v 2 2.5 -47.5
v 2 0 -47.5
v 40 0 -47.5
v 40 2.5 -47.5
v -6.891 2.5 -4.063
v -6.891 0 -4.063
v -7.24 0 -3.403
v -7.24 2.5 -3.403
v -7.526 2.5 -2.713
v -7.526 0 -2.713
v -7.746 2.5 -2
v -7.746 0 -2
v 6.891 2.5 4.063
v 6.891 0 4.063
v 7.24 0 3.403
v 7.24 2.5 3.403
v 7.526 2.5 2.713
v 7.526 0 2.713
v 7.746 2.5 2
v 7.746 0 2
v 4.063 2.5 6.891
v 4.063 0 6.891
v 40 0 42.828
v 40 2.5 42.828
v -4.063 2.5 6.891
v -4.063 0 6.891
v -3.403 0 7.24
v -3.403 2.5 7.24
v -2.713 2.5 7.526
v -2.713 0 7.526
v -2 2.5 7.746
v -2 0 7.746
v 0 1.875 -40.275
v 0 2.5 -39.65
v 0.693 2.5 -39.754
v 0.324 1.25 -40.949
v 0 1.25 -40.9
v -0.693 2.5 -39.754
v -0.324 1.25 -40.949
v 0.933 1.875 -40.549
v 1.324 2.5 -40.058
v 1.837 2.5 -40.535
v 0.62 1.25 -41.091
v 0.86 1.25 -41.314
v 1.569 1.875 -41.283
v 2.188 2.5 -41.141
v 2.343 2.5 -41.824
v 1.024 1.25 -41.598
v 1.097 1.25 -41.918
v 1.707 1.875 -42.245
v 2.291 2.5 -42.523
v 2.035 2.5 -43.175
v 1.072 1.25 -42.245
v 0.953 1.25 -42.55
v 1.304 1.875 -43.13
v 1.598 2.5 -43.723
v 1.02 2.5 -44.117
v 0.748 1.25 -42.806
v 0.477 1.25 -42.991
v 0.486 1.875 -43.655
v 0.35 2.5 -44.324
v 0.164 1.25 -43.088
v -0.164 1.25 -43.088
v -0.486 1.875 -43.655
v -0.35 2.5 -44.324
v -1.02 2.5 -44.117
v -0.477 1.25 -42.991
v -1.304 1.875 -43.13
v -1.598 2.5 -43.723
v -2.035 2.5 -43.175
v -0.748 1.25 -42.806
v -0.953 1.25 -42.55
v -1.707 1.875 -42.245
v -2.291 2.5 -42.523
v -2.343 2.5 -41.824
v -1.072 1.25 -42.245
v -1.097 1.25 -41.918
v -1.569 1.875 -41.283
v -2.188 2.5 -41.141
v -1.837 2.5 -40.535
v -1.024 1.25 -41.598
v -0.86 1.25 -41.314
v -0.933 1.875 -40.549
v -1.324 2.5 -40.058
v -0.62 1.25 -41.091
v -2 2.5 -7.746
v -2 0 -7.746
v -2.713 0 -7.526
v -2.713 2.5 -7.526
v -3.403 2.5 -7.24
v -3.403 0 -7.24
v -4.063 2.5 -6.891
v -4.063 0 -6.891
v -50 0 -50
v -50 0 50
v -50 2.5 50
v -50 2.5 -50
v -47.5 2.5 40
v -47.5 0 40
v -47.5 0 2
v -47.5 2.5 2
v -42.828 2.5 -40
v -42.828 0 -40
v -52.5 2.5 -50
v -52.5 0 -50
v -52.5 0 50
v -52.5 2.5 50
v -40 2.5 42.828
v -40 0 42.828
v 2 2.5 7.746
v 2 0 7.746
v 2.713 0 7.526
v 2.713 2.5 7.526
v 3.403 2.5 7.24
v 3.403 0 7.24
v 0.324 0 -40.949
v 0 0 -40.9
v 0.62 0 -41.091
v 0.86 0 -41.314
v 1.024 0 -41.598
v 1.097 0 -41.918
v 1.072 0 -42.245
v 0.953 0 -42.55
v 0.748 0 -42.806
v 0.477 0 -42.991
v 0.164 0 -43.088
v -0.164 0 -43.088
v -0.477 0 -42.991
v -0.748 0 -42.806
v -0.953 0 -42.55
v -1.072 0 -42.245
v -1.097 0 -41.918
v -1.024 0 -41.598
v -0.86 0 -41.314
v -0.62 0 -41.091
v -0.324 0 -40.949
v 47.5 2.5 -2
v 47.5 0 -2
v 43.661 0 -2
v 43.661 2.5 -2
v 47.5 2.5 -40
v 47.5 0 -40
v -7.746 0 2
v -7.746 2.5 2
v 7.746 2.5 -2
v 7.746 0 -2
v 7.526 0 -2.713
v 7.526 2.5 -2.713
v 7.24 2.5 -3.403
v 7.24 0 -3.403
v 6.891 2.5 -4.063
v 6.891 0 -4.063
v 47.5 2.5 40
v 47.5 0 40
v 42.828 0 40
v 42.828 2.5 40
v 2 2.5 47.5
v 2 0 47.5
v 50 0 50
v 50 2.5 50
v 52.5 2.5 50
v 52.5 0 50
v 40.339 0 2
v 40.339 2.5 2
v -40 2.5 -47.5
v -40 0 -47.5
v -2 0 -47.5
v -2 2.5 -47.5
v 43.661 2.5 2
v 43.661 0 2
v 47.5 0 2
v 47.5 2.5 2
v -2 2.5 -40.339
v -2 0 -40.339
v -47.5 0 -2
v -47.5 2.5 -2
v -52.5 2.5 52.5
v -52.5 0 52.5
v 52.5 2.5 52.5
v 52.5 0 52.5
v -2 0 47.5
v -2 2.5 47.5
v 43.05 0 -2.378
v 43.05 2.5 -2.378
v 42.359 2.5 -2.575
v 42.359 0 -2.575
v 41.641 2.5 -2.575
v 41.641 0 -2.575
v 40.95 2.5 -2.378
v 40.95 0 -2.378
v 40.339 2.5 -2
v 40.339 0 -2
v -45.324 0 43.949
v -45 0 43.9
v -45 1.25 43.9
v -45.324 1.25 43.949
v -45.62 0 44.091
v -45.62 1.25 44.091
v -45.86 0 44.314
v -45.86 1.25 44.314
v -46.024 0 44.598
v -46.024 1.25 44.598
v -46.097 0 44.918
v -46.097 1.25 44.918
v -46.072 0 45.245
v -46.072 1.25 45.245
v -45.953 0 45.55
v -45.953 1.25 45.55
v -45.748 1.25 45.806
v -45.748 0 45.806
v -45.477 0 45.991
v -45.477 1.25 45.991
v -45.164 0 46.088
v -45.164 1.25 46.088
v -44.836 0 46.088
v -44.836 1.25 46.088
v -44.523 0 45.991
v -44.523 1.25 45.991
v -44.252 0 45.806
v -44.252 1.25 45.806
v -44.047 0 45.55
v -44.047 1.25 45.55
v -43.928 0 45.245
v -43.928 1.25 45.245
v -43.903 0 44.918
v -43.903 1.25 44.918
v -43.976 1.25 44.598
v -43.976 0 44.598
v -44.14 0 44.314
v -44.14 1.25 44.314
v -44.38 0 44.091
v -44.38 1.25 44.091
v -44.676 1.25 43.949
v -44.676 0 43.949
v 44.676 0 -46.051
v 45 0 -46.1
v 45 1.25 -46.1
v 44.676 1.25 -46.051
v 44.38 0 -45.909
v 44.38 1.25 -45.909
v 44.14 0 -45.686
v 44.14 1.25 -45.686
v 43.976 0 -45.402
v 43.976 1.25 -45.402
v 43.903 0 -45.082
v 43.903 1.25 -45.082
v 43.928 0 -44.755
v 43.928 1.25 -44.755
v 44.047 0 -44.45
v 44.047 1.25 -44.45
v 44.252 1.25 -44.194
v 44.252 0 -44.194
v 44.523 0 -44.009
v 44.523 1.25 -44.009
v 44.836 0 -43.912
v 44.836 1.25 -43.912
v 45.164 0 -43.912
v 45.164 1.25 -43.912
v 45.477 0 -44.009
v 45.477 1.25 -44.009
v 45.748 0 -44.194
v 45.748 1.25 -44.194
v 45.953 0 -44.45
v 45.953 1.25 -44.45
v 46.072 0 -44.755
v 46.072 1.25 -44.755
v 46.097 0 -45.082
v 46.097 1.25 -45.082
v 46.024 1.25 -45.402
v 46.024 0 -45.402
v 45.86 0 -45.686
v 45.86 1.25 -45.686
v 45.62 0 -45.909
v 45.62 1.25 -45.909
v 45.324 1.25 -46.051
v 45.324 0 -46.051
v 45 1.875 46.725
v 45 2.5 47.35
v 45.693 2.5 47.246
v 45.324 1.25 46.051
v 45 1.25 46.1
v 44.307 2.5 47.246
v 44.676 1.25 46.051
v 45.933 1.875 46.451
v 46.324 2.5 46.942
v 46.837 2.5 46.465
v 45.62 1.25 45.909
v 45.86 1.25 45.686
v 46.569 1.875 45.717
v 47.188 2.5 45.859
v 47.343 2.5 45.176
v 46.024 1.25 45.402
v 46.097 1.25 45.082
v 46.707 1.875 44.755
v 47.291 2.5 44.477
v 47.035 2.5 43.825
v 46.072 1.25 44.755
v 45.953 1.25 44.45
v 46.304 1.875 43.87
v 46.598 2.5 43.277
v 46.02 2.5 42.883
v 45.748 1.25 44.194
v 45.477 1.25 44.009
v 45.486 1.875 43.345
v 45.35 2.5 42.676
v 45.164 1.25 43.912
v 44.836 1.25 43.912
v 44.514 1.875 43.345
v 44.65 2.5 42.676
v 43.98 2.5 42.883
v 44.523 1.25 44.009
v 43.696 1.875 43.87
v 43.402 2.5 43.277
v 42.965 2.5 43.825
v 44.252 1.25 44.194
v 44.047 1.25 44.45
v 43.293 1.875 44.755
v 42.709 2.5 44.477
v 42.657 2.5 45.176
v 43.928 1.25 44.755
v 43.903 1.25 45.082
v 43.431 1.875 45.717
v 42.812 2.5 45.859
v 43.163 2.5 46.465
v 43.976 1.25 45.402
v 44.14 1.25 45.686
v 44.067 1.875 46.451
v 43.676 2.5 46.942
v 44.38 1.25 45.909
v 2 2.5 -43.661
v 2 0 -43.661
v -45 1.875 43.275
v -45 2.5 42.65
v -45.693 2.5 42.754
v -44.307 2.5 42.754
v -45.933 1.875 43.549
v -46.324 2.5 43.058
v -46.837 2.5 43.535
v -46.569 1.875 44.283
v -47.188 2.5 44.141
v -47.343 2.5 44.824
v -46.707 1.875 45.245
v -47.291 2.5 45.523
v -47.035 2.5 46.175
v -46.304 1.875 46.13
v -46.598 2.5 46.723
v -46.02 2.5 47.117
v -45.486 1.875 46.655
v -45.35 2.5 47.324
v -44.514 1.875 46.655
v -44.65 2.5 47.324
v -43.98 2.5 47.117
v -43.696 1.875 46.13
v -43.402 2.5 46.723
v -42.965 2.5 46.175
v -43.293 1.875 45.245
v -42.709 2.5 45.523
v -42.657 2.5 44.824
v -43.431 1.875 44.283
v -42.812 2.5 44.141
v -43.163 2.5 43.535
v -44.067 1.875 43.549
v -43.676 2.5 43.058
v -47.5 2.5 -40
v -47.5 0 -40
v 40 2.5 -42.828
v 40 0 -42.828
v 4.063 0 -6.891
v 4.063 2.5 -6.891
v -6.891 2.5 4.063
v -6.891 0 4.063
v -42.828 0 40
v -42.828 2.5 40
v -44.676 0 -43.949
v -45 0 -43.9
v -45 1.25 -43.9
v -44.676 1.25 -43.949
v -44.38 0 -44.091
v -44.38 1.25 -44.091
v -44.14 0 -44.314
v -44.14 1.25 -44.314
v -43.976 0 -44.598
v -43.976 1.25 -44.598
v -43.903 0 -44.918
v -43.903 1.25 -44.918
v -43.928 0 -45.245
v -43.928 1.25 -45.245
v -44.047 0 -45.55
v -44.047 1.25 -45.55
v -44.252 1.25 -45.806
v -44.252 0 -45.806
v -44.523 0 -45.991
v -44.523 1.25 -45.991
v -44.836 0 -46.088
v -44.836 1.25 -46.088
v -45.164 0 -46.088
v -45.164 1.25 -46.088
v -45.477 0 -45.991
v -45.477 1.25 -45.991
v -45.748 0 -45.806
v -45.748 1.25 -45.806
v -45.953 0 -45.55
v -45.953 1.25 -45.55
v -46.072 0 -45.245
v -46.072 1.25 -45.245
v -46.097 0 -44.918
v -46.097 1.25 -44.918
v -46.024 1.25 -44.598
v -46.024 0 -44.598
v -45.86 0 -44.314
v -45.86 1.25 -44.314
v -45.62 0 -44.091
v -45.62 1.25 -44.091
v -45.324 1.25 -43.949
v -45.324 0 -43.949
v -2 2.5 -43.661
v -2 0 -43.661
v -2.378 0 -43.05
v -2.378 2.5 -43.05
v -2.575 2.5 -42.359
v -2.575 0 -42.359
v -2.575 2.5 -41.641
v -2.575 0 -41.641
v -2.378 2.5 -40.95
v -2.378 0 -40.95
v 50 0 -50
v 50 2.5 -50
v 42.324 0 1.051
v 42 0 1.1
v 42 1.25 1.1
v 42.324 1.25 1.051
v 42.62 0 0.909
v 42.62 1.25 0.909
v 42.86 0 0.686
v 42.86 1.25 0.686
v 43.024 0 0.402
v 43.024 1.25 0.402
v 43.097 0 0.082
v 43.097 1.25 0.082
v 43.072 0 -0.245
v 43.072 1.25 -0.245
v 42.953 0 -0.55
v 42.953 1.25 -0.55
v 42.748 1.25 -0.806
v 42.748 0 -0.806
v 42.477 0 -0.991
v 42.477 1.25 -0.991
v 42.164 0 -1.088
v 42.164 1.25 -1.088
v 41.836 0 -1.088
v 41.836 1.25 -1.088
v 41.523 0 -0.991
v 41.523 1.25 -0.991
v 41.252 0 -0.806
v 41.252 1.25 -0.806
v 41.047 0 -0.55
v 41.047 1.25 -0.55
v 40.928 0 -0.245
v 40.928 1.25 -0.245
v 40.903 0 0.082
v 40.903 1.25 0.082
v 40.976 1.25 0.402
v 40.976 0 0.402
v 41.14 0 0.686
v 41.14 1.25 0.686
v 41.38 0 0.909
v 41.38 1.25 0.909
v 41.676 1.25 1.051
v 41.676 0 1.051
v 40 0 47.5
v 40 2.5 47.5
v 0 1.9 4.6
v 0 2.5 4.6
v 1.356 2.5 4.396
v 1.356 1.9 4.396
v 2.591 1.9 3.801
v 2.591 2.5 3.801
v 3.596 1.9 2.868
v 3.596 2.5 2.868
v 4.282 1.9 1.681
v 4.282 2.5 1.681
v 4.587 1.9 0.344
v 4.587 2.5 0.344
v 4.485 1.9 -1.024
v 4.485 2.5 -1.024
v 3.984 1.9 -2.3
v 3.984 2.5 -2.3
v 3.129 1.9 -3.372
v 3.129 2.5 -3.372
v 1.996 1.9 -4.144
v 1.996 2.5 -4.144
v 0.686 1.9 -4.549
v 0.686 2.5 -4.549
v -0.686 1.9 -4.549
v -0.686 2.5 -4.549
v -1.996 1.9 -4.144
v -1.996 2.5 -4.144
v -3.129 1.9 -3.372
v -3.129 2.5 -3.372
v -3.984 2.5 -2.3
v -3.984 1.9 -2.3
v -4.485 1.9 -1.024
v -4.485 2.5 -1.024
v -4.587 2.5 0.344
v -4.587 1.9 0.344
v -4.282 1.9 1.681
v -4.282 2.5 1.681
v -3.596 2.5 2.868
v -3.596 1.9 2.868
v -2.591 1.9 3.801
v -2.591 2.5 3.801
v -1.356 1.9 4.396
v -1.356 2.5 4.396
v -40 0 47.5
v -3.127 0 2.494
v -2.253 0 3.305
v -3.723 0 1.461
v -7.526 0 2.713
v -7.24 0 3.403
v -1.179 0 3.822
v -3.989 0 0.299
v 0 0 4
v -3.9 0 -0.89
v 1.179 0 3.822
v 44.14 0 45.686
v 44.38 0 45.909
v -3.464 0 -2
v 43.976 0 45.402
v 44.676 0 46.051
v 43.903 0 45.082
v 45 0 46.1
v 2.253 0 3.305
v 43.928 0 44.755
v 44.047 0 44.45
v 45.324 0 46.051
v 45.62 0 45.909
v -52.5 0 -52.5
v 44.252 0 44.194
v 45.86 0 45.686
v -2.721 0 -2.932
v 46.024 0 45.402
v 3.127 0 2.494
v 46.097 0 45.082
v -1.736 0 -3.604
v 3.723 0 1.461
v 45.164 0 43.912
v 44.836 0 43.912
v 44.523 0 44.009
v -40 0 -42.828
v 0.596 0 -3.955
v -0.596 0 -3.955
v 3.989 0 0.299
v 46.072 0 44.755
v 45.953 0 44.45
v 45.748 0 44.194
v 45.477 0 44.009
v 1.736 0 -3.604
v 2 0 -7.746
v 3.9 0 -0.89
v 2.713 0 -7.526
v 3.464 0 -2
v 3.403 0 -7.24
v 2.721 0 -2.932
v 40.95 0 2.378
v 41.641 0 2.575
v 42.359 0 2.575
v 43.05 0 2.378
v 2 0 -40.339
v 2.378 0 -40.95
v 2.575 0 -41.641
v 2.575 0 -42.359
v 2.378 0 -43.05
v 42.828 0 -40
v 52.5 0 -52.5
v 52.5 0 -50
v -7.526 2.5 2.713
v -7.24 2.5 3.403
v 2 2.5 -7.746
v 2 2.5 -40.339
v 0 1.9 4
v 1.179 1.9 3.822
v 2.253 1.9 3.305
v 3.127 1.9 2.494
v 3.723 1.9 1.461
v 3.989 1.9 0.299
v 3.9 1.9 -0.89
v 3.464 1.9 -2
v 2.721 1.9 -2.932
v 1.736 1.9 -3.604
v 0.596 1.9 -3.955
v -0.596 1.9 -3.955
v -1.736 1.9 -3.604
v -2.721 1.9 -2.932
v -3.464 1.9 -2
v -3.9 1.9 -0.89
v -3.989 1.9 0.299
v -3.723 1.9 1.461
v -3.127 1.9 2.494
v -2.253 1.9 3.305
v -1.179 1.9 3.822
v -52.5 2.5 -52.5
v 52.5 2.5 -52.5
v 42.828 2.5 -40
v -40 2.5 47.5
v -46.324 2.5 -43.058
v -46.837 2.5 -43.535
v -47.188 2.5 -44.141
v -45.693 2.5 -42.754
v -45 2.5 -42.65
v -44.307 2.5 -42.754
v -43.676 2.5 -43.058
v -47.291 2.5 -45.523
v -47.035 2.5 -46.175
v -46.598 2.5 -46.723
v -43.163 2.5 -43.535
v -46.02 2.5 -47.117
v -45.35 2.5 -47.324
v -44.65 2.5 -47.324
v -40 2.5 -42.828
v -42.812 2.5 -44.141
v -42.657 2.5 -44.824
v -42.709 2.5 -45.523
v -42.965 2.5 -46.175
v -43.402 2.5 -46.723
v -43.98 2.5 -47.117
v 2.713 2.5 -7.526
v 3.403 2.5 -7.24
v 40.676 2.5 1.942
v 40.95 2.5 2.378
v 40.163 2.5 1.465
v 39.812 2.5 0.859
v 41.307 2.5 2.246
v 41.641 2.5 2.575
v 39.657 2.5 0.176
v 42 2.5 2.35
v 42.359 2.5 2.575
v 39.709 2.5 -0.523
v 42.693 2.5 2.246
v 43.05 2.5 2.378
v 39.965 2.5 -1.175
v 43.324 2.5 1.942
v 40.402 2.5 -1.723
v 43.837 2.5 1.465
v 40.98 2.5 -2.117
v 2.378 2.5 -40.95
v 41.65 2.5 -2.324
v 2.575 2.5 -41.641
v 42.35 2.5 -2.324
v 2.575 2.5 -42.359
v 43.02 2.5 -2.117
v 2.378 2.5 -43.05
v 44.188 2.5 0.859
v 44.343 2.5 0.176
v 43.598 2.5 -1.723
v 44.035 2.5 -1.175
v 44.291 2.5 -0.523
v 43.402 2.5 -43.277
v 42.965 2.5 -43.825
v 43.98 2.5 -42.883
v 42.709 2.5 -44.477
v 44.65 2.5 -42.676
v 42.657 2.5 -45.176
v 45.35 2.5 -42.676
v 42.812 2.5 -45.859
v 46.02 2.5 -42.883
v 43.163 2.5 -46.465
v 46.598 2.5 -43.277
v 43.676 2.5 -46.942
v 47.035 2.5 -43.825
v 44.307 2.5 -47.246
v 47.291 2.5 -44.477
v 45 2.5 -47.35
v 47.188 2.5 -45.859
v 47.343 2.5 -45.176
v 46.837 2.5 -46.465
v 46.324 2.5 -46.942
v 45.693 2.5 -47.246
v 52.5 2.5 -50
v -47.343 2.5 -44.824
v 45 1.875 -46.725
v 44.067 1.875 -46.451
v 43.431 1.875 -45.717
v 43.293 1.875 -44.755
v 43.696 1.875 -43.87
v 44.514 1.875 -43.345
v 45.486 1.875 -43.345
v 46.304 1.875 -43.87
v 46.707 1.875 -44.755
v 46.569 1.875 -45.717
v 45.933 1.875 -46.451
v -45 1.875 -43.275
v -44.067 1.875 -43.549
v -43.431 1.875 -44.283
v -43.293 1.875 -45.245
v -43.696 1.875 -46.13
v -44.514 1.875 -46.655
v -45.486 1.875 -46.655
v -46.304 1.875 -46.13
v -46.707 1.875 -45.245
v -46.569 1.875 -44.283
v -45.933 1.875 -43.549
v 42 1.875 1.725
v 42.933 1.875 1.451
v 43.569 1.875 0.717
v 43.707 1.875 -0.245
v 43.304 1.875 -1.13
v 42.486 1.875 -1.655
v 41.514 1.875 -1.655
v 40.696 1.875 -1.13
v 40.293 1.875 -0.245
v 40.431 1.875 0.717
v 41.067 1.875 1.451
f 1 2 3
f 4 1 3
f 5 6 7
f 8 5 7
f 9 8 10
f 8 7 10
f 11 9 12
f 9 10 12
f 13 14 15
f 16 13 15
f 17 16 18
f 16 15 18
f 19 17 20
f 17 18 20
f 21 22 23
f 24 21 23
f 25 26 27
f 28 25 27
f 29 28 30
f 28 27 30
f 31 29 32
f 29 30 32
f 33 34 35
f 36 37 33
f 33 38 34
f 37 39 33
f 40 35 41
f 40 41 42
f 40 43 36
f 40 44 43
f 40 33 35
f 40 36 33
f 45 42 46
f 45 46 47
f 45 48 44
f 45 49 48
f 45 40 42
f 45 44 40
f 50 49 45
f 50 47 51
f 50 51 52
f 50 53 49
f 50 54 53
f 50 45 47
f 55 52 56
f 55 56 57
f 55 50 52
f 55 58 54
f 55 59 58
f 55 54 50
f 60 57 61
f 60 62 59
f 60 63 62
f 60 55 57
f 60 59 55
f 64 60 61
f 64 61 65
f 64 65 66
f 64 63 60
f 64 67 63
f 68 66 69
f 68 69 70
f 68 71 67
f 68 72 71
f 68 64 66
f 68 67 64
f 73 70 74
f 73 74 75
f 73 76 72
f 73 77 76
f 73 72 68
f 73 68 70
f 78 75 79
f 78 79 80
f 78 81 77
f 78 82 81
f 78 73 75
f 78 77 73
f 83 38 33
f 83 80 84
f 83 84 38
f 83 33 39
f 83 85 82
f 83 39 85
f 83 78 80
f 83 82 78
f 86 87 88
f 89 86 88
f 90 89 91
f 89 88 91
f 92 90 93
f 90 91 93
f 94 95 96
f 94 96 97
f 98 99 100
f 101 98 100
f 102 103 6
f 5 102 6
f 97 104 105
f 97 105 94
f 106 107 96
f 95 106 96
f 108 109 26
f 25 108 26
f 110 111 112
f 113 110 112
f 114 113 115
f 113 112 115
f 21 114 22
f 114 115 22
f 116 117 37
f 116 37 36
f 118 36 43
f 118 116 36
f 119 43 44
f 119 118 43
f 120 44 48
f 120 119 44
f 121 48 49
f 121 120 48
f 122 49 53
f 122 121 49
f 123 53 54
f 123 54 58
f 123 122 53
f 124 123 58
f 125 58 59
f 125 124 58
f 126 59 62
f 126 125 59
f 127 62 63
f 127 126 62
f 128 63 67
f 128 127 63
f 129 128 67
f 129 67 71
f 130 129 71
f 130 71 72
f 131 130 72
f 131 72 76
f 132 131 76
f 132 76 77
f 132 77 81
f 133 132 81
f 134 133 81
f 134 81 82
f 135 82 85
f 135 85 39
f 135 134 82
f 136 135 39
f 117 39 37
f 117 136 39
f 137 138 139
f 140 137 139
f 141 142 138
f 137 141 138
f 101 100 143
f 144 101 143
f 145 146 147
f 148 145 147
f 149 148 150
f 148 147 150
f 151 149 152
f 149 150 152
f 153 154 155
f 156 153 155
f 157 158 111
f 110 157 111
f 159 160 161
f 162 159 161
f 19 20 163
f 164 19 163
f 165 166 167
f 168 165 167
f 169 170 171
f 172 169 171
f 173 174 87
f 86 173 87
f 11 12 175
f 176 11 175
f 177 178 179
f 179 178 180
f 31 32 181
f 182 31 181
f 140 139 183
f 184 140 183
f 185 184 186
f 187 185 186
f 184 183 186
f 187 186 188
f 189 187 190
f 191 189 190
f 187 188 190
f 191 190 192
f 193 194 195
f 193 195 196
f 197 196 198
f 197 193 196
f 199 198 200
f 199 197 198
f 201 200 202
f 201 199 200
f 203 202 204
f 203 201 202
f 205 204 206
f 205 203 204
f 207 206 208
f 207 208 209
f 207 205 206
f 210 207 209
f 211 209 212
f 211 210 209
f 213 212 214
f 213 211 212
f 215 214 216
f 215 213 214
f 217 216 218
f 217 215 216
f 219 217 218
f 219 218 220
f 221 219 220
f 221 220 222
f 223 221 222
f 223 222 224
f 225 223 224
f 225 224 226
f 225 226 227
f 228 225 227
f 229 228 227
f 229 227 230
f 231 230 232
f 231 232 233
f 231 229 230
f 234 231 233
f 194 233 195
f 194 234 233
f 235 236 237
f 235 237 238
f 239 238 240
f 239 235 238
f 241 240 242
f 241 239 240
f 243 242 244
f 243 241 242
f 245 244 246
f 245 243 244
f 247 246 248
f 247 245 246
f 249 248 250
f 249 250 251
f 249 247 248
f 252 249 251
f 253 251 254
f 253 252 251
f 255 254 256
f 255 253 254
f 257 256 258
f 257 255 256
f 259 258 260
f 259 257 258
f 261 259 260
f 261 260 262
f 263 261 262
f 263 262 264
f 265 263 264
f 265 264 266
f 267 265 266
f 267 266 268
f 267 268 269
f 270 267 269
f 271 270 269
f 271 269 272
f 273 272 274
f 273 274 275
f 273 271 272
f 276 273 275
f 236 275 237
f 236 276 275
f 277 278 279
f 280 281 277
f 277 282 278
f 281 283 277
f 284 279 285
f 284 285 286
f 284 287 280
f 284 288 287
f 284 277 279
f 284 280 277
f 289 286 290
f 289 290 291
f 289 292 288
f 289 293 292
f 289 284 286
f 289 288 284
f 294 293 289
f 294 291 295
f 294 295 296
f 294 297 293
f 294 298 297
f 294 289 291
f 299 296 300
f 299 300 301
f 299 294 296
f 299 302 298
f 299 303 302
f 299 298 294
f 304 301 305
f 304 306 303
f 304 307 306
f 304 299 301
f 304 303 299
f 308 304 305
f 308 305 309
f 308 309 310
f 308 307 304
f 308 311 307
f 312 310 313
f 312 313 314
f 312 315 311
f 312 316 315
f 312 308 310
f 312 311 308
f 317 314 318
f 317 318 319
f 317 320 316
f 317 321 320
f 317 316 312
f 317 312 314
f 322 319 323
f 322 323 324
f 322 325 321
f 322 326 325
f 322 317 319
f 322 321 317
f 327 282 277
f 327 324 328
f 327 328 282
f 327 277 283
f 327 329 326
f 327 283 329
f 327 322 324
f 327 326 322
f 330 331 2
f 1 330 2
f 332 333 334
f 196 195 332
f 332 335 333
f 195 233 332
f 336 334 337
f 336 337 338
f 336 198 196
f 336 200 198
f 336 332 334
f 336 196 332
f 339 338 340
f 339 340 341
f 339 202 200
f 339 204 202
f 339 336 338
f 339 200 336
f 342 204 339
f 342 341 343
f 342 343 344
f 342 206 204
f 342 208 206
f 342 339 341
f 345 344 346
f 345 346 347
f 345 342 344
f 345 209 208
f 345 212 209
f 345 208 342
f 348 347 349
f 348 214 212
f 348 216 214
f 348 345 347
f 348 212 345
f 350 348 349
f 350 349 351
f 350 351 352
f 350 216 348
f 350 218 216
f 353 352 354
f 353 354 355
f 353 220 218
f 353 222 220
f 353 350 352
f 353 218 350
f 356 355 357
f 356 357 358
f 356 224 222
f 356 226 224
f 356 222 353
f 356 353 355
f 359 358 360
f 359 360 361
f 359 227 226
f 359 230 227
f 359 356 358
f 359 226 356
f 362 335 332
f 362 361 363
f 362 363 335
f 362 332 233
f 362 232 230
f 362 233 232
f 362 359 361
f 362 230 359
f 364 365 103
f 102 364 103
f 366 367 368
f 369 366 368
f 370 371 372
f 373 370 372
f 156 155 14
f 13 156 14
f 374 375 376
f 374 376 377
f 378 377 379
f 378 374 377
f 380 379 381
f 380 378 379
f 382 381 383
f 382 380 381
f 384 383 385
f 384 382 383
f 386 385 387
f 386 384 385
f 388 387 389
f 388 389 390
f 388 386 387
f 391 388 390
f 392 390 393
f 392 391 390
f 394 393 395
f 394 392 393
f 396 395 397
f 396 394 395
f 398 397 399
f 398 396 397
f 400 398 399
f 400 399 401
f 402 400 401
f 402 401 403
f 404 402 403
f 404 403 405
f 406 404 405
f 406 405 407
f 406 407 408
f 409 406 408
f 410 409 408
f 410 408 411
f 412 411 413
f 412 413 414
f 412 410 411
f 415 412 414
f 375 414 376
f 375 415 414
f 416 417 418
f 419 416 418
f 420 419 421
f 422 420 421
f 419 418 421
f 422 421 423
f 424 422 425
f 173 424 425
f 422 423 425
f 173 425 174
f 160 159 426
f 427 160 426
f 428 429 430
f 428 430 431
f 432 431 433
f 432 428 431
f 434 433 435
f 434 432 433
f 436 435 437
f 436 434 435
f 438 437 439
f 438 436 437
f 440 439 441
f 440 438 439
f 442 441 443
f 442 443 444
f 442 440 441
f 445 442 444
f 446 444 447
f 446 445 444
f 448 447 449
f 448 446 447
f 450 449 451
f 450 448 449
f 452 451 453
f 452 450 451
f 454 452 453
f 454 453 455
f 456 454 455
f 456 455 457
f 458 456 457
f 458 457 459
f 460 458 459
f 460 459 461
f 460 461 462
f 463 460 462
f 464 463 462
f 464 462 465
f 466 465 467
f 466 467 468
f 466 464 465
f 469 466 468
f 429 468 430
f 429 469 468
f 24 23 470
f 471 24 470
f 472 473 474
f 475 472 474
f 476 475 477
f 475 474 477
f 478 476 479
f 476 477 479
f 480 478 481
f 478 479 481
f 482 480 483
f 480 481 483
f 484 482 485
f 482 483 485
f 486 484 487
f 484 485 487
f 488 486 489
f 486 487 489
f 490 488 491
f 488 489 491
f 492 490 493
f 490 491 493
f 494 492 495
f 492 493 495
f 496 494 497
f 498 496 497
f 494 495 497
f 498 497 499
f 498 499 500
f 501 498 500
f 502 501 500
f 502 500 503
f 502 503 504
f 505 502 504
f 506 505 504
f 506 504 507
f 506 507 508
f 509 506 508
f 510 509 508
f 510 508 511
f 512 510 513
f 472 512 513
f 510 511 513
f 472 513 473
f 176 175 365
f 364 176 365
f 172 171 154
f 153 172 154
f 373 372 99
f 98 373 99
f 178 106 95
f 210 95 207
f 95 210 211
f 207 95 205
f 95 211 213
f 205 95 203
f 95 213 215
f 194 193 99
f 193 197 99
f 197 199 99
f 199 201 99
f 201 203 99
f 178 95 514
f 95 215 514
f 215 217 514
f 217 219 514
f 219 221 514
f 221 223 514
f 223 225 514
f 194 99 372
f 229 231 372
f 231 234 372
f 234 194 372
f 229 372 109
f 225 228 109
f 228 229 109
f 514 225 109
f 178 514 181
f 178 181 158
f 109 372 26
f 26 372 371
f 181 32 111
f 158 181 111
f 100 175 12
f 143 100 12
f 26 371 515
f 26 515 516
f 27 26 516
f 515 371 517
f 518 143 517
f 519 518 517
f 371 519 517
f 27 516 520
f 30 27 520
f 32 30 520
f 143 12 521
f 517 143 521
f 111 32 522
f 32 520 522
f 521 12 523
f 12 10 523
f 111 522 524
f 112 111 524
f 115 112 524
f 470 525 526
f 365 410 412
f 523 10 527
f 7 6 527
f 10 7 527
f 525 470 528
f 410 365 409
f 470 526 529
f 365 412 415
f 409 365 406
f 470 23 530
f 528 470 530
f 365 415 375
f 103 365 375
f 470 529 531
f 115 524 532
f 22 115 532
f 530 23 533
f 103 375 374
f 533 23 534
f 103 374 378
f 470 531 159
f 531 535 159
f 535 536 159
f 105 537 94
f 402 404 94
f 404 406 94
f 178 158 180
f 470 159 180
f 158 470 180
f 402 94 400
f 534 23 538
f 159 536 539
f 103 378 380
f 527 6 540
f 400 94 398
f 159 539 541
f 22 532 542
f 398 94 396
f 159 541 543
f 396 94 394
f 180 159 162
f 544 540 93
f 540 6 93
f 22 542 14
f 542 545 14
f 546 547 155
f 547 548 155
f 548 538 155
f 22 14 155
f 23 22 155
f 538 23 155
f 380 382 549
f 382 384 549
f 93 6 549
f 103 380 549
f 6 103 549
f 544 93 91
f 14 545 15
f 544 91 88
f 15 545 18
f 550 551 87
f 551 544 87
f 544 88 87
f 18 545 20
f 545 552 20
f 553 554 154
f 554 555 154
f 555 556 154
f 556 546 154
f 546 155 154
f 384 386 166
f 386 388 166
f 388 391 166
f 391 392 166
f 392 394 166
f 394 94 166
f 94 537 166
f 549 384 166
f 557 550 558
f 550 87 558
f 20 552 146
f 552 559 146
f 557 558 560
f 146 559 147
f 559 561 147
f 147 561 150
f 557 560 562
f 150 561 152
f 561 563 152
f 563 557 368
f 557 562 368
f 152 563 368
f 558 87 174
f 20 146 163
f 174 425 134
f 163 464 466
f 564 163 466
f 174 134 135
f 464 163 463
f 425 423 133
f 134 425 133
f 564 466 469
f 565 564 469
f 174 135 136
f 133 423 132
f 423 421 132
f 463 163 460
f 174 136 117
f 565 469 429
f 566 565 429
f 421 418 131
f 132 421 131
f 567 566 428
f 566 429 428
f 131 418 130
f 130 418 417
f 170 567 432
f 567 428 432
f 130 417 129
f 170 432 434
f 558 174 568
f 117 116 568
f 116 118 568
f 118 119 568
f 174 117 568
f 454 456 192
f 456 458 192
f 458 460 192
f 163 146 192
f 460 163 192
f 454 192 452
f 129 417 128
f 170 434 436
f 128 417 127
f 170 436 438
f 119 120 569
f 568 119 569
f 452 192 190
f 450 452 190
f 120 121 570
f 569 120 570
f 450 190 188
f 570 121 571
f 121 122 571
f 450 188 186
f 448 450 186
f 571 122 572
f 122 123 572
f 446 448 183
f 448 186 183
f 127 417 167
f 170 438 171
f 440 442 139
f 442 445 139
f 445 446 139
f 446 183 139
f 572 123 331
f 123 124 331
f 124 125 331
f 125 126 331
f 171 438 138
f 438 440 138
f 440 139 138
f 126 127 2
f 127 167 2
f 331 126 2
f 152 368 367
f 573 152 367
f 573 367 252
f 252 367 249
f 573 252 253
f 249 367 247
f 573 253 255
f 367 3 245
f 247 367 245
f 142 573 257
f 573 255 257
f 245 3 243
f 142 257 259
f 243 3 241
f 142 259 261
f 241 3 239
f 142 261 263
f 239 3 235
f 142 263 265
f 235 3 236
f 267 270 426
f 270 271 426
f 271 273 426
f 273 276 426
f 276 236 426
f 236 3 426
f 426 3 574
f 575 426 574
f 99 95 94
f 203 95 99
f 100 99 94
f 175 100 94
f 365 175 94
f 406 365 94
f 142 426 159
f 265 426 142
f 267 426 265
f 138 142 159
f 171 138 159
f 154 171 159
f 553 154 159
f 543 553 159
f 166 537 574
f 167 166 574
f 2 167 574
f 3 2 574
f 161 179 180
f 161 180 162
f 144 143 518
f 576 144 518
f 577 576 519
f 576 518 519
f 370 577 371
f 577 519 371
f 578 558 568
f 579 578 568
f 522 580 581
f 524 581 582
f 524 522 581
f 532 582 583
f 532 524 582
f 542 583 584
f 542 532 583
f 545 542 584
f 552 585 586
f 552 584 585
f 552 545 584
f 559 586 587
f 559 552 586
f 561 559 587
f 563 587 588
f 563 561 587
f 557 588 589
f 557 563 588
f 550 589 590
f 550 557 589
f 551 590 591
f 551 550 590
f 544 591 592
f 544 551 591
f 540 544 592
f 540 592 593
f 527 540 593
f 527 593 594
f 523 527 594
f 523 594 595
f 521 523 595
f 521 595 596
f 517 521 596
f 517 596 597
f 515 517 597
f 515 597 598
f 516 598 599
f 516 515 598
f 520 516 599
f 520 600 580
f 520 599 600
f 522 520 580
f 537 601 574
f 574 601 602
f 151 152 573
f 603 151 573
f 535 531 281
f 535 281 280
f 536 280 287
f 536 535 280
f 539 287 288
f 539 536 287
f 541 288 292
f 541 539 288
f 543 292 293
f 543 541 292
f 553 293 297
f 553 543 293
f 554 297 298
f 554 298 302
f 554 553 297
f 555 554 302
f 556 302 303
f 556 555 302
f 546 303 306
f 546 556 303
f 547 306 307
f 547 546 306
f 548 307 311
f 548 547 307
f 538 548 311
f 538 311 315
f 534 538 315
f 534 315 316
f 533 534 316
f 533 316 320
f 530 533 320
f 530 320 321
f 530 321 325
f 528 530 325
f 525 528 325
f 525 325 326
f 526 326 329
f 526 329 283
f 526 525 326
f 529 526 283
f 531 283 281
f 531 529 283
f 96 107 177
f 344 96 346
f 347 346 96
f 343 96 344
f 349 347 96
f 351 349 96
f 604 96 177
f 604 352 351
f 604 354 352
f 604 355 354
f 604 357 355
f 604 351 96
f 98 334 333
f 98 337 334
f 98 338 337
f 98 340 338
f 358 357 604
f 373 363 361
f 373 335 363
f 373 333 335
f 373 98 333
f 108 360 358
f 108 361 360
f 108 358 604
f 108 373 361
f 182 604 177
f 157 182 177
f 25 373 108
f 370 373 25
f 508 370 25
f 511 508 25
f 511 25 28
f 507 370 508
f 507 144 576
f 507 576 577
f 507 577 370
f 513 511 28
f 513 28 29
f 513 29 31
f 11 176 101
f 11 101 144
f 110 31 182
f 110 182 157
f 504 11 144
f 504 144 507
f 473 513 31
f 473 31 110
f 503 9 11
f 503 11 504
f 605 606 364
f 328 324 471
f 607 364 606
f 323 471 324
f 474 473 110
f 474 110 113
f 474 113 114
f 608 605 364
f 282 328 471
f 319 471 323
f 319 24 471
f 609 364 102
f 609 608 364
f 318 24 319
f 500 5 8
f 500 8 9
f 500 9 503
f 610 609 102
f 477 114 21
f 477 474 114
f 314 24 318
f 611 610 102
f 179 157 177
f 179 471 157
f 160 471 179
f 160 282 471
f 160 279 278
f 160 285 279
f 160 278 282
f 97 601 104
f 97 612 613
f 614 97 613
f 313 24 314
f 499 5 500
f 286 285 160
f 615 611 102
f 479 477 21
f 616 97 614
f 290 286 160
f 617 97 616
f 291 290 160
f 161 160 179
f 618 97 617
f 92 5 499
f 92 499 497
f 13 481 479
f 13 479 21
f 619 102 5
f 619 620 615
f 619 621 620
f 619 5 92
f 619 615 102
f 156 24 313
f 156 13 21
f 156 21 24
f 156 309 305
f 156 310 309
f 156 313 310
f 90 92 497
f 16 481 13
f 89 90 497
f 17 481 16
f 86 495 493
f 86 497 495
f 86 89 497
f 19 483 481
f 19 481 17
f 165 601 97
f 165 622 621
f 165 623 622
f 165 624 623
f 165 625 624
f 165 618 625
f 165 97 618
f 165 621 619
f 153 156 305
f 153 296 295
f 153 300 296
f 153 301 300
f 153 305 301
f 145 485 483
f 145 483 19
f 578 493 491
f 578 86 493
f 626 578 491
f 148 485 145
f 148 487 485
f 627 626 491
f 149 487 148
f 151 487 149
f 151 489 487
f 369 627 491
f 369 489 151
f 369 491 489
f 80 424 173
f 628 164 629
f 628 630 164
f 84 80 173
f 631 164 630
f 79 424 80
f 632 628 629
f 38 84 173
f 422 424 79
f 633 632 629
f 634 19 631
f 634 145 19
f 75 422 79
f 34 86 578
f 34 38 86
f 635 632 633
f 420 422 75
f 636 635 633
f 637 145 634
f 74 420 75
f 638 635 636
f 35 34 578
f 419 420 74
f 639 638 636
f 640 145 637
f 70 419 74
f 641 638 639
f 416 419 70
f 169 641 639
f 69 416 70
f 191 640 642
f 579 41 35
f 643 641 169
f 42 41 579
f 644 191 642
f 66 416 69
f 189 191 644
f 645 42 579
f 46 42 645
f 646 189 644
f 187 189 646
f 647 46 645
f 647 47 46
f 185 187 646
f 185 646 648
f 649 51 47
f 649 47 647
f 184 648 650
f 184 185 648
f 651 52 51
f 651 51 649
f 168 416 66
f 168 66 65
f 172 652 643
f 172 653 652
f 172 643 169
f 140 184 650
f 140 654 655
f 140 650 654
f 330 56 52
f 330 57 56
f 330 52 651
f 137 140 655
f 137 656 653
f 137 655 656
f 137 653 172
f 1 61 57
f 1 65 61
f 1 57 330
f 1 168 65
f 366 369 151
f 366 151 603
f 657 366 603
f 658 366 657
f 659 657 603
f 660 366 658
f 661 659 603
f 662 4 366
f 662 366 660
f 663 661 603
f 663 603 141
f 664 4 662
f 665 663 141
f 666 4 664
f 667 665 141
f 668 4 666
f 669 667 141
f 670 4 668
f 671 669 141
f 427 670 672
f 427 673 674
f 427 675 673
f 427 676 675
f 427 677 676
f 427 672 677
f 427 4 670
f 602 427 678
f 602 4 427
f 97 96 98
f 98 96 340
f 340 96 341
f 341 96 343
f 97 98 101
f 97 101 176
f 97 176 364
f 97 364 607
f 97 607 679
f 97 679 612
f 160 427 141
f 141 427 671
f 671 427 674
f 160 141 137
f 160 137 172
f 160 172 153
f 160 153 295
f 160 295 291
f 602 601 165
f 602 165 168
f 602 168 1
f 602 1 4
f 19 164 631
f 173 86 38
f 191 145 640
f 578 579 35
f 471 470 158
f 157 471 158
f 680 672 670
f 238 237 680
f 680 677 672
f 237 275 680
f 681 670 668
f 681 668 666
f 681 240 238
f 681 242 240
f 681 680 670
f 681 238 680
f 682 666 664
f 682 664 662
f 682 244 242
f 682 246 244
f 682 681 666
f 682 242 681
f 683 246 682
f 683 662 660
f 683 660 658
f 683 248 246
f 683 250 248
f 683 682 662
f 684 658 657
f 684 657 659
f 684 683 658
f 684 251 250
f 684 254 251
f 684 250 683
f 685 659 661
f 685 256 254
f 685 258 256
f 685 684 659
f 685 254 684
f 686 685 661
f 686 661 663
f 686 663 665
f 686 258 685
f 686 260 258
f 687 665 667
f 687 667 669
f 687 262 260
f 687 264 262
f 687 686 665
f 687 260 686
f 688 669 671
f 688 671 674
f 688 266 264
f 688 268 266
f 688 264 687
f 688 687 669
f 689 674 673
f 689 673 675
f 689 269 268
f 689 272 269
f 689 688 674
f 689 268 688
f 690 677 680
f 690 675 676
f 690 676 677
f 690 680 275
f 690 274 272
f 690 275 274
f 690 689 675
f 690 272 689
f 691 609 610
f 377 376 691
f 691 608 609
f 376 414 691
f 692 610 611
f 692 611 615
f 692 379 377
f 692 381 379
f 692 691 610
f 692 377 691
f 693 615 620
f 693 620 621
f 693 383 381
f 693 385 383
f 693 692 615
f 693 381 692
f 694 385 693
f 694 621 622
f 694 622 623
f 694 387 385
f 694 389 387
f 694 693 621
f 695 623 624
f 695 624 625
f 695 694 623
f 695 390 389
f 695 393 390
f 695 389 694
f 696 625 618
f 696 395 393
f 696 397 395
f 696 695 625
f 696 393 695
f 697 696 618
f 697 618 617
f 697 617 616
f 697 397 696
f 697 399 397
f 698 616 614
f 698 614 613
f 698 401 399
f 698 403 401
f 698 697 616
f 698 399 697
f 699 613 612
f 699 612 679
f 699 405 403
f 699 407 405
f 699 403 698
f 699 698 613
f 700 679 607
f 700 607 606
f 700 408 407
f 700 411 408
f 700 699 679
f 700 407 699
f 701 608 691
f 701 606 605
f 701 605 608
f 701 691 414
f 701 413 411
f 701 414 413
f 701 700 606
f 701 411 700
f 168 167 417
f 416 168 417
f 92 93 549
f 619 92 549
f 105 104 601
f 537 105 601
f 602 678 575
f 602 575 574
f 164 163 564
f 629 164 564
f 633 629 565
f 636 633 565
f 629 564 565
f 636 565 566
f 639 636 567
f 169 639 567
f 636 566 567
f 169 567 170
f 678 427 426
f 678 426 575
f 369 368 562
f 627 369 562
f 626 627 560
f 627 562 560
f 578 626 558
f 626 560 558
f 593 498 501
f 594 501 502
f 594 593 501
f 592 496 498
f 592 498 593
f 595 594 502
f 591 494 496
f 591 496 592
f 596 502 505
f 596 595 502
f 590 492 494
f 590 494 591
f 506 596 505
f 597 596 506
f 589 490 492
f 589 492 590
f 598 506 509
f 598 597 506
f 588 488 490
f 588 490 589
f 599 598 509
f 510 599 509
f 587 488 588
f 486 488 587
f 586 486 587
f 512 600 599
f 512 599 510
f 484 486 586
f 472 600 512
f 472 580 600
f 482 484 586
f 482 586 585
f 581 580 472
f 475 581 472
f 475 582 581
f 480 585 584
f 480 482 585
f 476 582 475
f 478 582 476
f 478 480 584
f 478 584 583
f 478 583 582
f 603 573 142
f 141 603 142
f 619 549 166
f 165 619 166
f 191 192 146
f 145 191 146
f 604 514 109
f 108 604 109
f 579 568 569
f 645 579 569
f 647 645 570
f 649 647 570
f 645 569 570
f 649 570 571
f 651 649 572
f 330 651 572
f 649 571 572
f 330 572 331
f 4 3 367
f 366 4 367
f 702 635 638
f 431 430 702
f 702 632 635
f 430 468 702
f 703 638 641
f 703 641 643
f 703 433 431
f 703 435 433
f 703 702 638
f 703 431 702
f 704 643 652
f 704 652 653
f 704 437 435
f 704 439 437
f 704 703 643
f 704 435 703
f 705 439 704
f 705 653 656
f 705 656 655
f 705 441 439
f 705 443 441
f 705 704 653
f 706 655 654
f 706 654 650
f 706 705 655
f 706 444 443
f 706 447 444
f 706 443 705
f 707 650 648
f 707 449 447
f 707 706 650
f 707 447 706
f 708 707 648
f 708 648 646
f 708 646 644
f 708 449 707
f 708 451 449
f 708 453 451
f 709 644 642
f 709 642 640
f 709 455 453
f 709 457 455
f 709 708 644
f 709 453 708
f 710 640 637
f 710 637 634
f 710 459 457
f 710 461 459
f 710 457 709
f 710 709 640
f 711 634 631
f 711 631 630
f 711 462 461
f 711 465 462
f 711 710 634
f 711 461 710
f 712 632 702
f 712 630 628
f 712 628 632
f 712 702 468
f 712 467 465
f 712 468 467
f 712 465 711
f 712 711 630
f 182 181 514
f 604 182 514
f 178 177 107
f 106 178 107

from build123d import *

# Parameters (mm, degrees)
SKETCH1_W           = 100
SKETCH1_H           = 105
SKETCH1_R           = 1.1
BOSS_EXTRUDE1_DEPTH = 2.5
SKETCH3_R           = 4
SKETCH3_R_2         = 1.1
BOSS_EXTRUDE2_DEPTH = 2.5
CHAMFER1_SIZE       = 1.25
SKETCH2_R           = 4.6
CUT_EXTRUDE1_DEPTH  = 0.6
SKETCH11_W          = 2.5
SKETCH11_H          = 2.5
BOSS_EXTRUDE5_DEPTH = 2.5


with BuildPart() as part:
    # Sketch1 → Boss-Extrude1 (new body)
    with BuildSketch(Plane(origin=(0, 0, 0), x_dir=(1, 0, 0), z_dir=(0, 1, 0))):
        Rectangle(SKETCH1_W, SKETCH1_H)
        with Locations(Location((-45, 45, 0), (0, 0, 270))):
            Circle(SKETCH1_R, mode=Mode.SUBTRACT)
        with Locations(Location((45, 45, 0), (0, 0, 90))):
            Circle(SKETCH1_R, mode=Mode.SUBTRACT)
        with Locations(Location((45, -45, 0), (0, 0, 270))):
            Circle(SKETCH1_R, mode=Mode.SUBTRACT)
        with Locations(Location((-45, -45, 0), (0, 0, 90))):
            Circle(SKETCH1_R, mode=Mode.SUBTRACT)
        Polygon((-40, 47.5), (40, 47.5), (40, 40), (47.5, 40), (47.5, -40), (40, -40), (40, -47.5), (-40, -47.5), (-40, -40), (-47.5, -40), (-47.5, 40), (-40, 40), align=None, mode=Mode.SUBTRACT)
    extrude(amount=BOSS_EXTRUDE1_DEPTH)

    # Sketch3 → Boss-Extrude2 (add)
    with BuildSketch(Plane(origin=(0, 0, 0), x_dir=(1, 0, 0), z_dir=(0, 1, 0))):
        with BuildLine():
            Line((-42.828427125, 40), (-6.891439137, 4.063012013))
            ThreePointArc((-6.891439137, 4.063012013), (-7.39103626, 3.061467459), (-7.745966692, 2))
            Line((-7.745966692, 2), (-40.338668084, 2))
            Line((-40.338668084, 2), (-47.5, 2))
            Line((-47.5, 2), (-47.5, -2))
            Line((-47.5, -2), (-43.661317629, -2))
            Line((-43.661317629, -2), (-7.745966692, -2))
            ThreePointArc((-7.745966692, -2), (-7.39103626, -3.061467459), (-6.891439137, -4.063012013))
            Line((-6.891439137, -4.063012013), (-42.828427125, -40))
            Line((-42.828427125, -40), (-40, -42.828427125))
            Line((-40, -42.828427125), (-4.063012013, -6.891439137))
            ThreePointArc((-4.063012013, -6.891439137), (-3.061467459, -7.39103626), (-2, -7.745966692))
            Line((-2, -7.745966692), (-2, -43.661317629))
            Line((-2, -43.661317629), (-2, -47.5))
            Line((-2, -47.5), (2, -47.5))
            Line((2, -47.5), (2, -43.661317629))
            Line((2, -43.661317629), (2, -7.745966692))
            ThreePointArc((2, -7.745966692), (3.061467459, -7.39103626), (4.063012013, -6.891439137))
            Line((4.063012013, -6.891439137), (40, -42.828427125))
            Line((40, -42.828427125), (42.828427125, -40))
            Line((42.828427125, -40), (6.891439137, -4.063012013))
            ThreePointArc((6.891439137, -4.063012013), (7.39103626, -3.061467459), (7.745966692, -2))
            Line((7.745966692, -2), (40.338675227, -2))
            ThreePointArc((40.338675227, -2), (42, -2.6), (43.661324773, -2))
            Line((43.661324773, -2), (47.5, -2))
            Line((47.5, -2), (47.5, 2))
            Line((47.5, 2), (43.661324773, 2))
            ThreePointArc((43.661324773, 2), (42, 2.6), (40.338675227, 2))
            Line((40.338675227, 2), (7.745966692, 2))
            ThreePointArc((7.745966692, 2), (7.39103626, 3.061467459), (6.891439137, 4.063012013))
            Line((6.891439137, 4.063012013), (42.828427125, 40))
            Line((42.828427125, 40), (40, 42.828427125))
            Line((40, 42.828427125), (4.063012013, 6.891439137))
            ThreePointArc((4.063012013, 6.891439137), (3.061467459, 7.39103626), (2, 7.745966692))
            Line((2, 7.745966692), (2, 40.338675227))
            ThreePointArc((2, 40.338675227), (2.6, 42), (2, 43.661324773))
            Line((2, 43.661324773), (2, 47.5))
            Line((2, 47.5), (-2, 47.5))
            Line((-2, 47.5), (-2, 43.661324773))
            ThreePointArc((-2, 43.661324773), (-2.6, 42), (-2, 40.338675227))
            Line((-2, 40.338675227), (-2, 7.745966692))
            ThreePointArc((-2, 7.745966692), (-3.061467459, 7.39103626), (-4.063012013, 6.891439137))
            Line((-4.063012013, 6.891439137), (-40, 42.828427125))
            Line((-40, 42.828427125), (-42.828427125, 40))
        make_face()
        with Locations(Location((0, 0, 0), (0, 0, 270))):
            Circle(SKETCH3_R, mode=Mode.SUBTRACT)
        with Locations(Location((0, 42, 0), (0, 0, 270))):
            Circle(SKETCH3_R_2, mode=Mode.SUBTRACT)
        with Locations(Location((42, 0, 0), (0, 0, 270))):
            Circle(SKETCH3_R_2, mode=Mode.SUBTRACT)
    extrude(amount=BOSS_EXTRUDE2_DEPTH)

    # Chamfer1
    chamfer1_edges = [part.edges().sort_by_distance(p)[0] for p in [
        (42, 2.5, -1.1),
        (-45, 2.5, -46.1),
        (45, 2.5, -43.9),
        (45, 2.5, 43.9),
        (-45, 2.5, 46.1),
        (0, 2.5, -43.1),
    ]]
    chamfer(chamfer1_edges, length=CHAMFER1_SIZE)

    # Sketch2 → Cut-Extrude1 (cut)
    with BuildSketch(Plane(origin=(0, 2.5, 0), x_dir=(1, 0, 0), z_dir=(0, 1, 0))):
        with Locations(Location((0, 0, 0), (0, 0, 270))):
            Circle(SKETCH2_R)
    extrude(amount=-CUT_EXTRUDE1_DEPTH, mode=Mode.SUBTRACT)

    # Sketch11 → Boss-Extrude5 (add)
    with BuildSketch(Plane(origin=(0, 2.5, 0), x_dir=(1, 0, 0), z_dir=(0, 1, 0))):
        with Locations((-51.25, 51.25)):
            Rectangle(SKETCH11_W, SKETCH11_H)
        with Locations((51.25, 51.25)):
            Rectangle(SKETCH11_W, SKETCH11_H)
        with Locations((-51.25, -51.25)):
            Rectangle(SKETCH11_W, SKETCH11_H)
        with Locations((51.25, -51.25)):
            Rectangle(SKETCH11_W, SKETCH11_H)
    extrude(amount=-BOSS_EXTRUDE5_DEPTH)


solid = part.part
